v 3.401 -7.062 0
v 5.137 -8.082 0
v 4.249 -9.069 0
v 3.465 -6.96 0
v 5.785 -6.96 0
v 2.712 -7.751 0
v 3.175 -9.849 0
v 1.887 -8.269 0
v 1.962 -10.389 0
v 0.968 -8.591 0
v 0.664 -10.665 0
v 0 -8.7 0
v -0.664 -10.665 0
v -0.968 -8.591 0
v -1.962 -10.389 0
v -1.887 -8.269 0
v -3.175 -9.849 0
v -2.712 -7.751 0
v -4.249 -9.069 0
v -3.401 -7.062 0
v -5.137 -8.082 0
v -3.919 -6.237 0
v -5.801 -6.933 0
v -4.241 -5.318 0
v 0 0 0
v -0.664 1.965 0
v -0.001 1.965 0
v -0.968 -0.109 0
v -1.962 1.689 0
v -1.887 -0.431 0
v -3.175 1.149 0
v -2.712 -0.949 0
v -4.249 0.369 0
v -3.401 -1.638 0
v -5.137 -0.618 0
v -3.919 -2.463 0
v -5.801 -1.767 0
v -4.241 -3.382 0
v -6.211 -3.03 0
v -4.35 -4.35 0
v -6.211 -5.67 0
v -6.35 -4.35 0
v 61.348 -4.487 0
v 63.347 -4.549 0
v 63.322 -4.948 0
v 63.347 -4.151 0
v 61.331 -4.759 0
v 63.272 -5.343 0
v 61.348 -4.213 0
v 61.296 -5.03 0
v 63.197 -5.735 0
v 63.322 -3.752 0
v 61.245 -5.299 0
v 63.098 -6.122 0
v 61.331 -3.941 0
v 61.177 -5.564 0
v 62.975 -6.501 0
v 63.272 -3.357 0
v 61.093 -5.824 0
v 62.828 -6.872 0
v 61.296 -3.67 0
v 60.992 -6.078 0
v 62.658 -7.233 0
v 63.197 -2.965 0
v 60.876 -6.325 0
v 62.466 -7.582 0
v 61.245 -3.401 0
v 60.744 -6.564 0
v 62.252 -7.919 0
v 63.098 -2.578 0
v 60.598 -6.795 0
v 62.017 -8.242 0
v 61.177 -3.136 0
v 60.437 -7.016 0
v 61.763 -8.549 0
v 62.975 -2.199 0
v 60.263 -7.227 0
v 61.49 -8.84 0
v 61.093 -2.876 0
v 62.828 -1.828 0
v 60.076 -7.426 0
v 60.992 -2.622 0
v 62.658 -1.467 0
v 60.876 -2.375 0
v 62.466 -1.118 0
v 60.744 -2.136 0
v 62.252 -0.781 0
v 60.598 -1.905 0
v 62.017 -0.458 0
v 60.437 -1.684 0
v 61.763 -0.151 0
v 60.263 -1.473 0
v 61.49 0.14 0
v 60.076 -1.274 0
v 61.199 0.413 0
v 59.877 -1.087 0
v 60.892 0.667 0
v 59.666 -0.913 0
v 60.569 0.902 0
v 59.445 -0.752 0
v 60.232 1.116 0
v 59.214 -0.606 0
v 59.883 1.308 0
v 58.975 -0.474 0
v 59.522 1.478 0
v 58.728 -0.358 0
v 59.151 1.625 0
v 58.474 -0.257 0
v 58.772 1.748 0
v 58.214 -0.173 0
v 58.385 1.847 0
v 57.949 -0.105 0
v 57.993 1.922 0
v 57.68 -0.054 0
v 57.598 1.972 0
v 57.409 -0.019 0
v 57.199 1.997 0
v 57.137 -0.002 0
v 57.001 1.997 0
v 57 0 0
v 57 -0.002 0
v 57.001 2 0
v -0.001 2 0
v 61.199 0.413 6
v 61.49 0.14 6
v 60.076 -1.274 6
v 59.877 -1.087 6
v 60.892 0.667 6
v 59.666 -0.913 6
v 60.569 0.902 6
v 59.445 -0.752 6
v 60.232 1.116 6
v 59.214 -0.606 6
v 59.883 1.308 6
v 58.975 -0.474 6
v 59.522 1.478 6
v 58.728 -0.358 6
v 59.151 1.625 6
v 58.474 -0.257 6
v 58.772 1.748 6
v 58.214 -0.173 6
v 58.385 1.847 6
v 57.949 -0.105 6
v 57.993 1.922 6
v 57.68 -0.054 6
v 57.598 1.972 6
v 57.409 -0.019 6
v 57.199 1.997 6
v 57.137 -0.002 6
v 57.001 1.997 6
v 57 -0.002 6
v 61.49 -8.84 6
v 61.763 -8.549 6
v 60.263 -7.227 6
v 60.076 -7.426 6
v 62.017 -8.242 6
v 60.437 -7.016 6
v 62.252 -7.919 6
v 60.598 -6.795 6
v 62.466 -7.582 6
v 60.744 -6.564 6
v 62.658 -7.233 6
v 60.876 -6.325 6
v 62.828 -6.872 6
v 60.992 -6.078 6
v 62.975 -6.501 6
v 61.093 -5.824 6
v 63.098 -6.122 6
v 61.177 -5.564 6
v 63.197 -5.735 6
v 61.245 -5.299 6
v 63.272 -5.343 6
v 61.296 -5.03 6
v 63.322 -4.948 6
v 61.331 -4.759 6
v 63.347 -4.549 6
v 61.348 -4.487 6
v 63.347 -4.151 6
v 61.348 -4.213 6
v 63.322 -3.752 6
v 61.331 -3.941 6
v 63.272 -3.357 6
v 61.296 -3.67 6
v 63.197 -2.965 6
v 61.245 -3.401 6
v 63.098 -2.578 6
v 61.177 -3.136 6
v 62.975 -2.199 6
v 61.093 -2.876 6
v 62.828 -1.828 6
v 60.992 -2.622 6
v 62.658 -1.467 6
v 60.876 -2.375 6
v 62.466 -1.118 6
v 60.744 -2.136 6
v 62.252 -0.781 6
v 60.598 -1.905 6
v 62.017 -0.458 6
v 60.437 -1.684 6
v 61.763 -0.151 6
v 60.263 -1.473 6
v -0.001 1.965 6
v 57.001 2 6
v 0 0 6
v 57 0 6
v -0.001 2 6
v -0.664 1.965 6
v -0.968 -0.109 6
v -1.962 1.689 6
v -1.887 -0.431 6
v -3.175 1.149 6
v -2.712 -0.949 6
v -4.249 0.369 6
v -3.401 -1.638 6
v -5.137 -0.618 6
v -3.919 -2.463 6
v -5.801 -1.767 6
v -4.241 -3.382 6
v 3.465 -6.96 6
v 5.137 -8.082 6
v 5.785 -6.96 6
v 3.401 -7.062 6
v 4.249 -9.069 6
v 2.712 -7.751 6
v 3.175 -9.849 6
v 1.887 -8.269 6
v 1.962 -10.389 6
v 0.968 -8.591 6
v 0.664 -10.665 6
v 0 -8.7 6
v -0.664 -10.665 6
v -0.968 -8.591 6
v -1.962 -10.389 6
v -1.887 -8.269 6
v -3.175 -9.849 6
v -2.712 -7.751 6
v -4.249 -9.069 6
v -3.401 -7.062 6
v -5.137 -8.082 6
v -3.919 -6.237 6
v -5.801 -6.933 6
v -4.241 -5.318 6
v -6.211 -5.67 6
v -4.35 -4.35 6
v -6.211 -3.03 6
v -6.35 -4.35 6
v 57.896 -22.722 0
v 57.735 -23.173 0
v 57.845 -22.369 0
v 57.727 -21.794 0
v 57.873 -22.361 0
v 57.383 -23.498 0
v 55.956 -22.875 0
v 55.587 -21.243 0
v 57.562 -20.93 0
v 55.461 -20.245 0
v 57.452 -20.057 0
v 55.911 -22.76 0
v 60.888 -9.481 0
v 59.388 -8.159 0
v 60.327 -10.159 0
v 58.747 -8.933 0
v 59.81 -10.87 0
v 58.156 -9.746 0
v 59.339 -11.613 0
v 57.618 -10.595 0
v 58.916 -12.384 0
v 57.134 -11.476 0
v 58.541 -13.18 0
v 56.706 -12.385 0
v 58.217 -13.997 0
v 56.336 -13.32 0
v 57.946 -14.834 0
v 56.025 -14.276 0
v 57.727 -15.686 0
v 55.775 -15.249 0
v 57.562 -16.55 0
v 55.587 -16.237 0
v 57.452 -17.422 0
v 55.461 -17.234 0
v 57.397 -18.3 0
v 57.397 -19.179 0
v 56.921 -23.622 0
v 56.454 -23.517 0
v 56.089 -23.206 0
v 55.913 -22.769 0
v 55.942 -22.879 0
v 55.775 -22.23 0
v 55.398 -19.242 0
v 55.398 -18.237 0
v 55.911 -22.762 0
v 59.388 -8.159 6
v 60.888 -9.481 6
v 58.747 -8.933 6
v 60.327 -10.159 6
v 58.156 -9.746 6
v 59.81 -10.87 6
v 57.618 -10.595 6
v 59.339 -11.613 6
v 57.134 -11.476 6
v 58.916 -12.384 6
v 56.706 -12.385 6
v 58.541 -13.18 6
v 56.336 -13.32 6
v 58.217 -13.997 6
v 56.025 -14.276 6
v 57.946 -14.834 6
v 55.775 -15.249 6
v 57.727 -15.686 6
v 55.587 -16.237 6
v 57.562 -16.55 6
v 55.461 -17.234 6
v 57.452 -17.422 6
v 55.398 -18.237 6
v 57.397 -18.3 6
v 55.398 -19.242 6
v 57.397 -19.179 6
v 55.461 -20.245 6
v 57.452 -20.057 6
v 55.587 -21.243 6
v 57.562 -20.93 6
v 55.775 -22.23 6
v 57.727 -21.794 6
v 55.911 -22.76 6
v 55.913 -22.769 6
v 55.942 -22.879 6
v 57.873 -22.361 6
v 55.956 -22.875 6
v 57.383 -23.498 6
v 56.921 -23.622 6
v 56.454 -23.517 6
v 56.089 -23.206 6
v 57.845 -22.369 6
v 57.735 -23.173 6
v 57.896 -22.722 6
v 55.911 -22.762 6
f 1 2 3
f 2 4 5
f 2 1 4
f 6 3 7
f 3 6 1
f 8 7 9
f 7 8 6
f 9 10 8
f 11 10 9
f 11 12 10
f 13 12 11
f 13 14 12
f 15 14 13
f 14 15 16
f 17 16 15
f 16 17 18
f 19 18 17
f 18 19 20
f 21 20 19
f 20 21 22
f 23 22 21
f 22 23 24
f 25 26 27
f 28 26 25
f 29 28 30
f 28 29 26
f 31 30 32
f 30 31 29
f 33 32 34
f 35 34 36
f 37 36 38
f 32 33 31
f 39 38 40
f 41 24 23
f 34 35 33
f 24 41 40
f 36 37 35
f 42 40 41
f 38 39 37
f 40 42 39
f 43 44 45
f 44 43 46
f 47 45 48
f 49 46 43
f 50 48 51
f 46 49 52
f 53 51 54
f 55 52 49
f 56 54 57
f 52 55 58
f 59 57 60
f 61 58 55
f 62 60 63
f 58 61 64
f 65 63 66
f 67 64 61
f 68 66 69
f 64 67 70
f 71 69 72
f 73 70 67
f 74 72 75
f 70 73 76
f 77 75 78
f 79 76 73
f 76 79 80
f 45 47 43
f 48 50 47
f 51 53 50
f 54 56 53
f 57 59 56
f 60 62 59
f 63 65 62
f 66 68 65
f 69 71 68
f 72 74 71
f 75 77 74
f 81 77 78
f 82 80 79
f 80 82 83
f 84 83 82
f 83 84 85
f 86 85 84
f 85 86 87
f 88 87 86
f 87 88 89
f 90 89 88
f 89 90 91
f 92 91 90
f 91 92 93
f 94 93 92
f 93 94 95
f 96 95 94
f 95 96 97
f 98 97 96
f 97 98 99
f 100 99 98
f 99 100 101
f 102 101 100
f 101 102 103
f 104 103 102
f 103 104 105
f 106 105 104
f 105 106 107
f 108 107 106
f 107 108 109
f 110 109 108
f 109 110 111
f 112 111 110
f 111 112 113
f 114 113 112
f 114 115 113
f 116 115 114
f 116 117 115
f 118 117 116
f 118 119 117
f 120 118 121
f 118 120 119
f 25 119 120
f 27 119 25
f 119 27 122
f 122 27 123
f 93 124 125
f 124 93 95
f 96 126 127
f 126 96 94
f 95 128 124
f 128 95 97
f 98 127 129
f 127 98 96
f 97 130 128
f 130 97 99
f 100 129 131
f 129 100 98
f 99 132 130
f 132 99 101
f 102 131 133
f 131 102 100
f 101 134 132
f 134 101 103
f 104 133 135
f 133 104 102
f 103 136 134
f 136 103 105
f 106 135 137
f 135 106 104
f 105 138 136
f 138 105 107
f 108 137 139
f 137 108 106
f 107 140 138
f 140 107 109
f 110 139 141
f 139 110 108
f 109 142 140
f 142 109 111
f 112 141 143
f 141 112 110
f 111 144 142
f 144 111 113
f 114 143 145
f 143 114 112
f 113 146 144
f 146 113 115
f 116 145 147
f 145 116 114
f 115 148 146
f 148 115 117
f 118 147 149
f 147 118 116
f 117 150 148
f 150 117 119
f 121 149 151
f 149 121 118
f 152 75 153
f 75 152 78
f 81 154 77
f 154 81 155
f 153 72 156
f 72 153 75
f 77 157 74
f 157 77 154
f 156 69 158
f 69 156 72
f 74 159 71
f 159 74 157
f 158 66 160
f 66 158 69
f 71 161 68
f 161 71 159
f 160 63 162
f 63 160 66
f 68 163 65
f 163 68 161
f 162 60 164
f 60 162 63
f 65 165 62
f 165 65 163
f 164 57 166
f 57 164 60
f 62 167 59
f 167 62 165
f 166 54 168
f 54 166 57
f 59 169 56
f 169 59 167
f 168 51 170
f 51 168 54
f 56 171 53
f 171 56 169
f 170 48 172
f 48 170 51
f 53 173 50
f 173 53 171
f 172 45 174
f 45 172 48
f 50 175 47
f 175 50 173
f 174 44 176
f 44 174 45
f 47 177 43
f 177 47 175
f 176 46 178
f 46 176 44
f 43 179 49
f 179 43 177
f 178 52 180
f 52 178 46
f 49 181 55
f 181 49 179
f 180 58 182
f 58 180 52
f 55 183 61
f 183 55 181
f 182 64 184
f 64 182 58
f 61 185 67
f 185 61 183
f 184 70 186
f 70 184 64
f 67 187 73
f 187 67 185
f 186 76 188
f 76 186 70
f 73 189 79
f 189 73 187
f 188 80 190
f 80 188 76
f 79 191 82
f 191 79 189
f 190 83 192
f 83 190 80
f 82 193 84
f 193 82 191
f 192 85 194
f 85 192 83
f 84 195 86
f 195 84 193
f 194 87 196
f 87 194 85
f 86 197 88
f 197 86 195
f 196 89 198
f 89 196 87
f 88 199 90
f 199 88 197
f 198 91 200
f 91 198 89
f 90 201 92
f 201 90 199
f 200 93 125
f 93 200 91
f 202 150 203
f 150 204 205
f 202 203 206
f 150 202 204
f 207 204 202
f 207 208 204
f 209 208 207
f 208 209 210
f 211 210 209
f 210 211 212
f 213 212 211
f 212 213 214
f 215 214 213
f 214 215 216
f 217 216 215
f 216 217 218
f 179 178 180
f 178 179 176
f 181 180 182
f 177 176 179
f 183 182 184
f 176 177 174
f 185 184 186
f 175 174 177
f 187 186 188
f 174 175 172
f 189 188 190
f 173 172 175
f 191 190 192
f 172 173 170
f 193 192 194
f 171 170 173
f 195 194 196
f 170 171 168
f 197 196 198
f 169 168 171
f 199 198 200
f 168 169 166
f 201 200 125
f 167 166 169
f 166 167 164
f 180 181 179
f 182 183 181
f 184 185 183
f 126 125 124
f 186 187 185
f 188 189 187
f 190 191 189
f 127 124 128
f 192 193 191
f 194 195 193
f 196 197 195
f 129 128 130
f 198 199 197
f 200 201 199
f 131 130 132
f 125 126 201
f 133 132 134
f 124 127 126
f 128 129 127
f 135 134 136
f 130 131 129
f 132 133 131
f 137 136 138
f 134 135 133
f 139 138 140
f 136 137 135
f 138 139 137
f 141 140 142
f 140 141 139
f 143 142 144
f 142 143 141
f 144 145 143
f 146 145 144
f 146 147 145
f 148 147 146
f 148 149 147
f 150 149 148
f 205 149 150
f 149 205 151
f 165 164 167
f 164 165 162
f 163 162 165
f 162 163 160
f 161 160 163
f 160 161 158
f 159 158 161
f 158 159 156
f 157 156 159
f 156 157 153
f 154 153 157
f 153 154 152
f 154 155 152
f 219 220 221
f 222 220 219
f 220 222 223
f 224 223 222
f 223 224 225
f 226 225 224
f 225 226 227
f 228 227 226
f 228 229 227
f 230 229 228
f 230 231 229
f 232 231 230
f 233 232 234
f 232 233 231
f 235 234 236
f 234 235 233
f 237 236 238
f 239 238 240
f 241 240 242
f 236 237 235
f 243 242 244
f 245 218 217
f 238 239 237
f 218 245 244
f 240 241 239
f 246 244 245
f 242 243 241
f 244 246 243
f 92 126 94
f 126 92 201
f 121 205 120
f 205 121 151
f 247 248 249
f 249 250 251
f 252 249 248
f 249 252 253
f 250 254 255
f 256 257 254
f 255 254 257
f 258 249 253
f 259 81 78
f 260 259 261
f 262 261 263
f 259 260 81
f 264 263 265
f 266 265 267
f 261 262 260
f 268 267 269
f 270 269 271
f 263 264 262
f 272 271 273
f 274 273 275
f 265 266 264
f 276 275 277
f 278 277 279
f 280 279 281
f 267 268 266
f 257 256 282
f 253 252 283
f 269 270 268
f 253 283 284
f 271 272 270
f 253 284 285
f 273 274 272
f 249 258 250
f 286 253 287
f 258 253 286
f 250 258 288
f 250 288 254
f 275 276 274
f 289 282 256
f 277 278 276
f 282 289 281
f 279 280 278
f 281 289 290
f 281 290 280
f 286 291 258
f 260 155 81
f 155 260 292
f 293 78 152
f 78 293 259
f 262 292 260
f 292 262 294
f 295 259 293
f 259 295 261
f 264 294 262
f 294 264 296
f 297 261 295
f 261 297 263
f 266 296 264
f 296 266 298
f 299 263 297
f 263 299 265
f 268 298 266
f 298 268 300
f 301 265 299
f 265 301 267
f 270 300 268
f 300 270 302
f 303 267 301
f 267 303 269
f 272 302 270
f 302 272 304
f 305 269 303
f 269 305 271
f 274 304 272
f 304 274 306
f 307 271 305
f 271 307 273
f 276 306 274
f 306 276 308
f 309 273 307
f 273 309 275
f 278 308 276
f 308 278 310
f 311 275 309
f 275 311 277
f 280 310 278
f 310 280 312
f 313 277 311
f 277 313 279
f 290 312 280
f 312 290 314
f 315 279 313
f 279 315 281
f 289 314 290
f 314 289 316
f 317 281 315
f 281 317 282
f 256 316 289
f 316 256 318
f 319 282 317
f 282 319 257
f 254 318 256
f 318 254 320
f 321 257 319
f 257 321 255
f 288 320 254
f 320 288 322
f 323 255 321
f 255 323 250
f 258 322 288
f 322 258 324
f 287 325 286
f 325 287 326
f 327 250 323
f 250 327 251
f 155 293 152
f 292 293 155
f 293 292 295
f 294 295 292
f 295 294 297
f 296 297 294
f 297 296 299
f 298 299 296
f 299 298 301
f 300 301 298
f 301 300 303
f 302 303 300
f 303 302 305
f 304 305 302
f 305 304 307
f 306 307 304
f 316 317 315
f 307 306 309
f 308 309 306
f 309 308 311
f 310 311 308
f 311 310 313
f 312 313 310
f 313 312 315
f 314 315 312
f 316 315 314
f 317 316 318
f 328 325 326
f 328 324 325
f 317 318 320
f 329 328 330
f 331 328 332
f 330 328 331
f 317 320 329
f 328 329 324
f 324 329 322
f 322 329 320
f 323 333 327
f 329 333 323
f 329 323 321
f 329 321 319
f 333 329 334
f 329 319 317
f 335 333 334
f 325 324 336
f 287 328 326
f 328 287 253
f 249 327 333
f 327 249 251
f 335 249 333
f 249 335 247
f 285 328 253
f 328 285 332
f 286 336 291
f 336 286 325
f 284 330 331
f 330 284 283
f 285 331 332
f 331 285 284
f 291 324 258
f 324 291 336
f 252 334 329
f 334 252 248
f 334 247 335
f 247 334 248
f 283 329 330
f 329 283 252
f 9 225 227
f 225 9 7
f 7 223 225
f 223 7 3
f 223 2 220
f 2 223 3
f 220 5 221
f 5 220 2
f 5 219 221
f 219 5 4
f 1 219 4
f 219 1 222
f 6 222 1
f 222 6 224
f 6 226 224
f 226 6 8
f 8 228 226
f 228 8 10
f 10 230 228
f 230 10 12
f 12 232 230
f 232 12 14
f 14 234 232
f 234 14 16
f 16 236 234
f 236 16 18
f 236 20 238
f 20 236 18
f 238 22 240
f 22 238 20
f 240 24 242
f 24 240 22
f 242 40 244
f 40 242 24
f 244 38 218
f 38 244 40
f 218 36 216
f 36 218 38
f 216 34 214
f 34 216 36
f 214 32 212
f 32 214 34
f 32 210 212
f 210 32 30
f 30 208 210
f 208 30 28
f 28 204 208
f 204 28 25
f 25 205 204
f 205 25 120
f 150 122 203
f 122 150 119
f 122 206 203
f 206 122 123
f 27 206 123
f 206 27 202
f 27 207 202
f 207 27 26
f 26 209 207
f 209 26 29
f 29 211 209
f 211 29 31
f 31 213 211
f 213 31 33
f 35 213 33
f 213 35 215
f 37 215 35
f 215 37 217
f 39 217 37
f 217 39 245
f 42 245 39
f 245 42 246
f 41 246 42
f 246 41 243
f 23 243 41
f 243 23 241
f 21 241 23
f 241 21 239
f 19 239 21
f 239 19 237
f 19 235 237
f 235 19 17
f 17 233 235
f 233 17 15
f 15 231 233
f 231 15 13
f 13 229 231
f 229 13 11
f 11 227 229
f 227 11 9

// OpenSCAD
// What is the diameter of your knob spindle? (mm) This means, what is the radius of the approximately cylindrical post that connects the larger knob to the cabinet?
spindle_diameter = 8.7;

// What is the distance between centers of your two knobs? (mm)
between_centers = 57;

// What is the desired thickness of the piece? (mm) This significantly affects the flexiblity of the piece so a thicker piece will make it harder to release and certainly more secure, more baby-proof. If you think it's too hard to release, make it thinner.
thickness = 2; //[1:0.2:4]

// What is the desired depth of the extrusion? (mm) You will need to tilt the preview to see the effect of this parameter.
depth = 6;

/* [Advanced] */

// Coefficient between 0.65 and 0.9 to define how tightly the fixed side of the lock holds onto the knob. Lower numbers mean it's more tightly held on there but may mean it's difficult to get it on there in the first place. I've found that about 0.8 is good with PLA.
fixed_side_tightness = 0.8;

// Radius of the release part (mm)
thumb_r = 16;

// Angle #1 to fine tune the geometry and "tightness" of the release (degrees)
thumb_angle = 135; //[100:2:150]

// Angle #2 to fine tune the geometry and "tightness" of the release (degrees)
thumb_angle2 = 60; //[30:2:100]

// preview[view:south, tilt:top]

linear_extrude(depth) {
    translate([-0.001,0,0]) square([between_centers+0.002,thickness]); //.001 and .002 are to ensure intersection
    translate([0,-spindle_diameter/2]) difference() {
        circle(r=spindle_diameter/2+thickness,$fs=1);
        translate([0,0]) circle(r=spindle_diameter/2,$fs=1);
        
        cutout_height = spindle_diameter*fixed_side_tightness;
        
        translate([0,(spindle_diameter/2)-cutout_height]) square([spindle_diameter+thickness,cutout_height]);
    }
}

translate([between_centers,-spindle_diameter/2,0]) rotate([0,0,-thumb_angle+90]) {
    mirror([1,1,0]) arc(thickness,depth,spindle_diameter/2+thickness,thumb_angle);
    
    translate([thumb_r+spindle_diameter/2,0,0]) mirror([0,1,0]) mirror([1,0,0]) mirror([1,1,0]) {
        
        arc(thickness,depth,thumb_r,thumb_angle2);
        rotate([0,0,-thumb_angle2]) translate([0,-thumb_r+thickness/2,0]) cylinder(h=depth,d=thickness,$fs=0.5);
        
    }
}

module arc( height, depth, radius, degrees ) {
    // This dies a horible death if it's not rendered here 
    // -- sucks up all memory and spins out of control 
    render() {
        difference() {
            // Outer ring
            rotate_extrude($fn = 100)
                translate([radius - height, 0, 0])
                    square([height,depth]);
         
            // Cut half off
            translate([0,-(radius+1),-.5]) 
                cube ([radius+1,(radius+1)*2,depth+1]);
         
            // Cover the other half as necessary
            rotate([0,0,180-degrees])
            translate([0,-(radius+1),-.5]) 
                cube ([radius+1,(radius+1)*2,depth+1]);
         
        }
    }
}
